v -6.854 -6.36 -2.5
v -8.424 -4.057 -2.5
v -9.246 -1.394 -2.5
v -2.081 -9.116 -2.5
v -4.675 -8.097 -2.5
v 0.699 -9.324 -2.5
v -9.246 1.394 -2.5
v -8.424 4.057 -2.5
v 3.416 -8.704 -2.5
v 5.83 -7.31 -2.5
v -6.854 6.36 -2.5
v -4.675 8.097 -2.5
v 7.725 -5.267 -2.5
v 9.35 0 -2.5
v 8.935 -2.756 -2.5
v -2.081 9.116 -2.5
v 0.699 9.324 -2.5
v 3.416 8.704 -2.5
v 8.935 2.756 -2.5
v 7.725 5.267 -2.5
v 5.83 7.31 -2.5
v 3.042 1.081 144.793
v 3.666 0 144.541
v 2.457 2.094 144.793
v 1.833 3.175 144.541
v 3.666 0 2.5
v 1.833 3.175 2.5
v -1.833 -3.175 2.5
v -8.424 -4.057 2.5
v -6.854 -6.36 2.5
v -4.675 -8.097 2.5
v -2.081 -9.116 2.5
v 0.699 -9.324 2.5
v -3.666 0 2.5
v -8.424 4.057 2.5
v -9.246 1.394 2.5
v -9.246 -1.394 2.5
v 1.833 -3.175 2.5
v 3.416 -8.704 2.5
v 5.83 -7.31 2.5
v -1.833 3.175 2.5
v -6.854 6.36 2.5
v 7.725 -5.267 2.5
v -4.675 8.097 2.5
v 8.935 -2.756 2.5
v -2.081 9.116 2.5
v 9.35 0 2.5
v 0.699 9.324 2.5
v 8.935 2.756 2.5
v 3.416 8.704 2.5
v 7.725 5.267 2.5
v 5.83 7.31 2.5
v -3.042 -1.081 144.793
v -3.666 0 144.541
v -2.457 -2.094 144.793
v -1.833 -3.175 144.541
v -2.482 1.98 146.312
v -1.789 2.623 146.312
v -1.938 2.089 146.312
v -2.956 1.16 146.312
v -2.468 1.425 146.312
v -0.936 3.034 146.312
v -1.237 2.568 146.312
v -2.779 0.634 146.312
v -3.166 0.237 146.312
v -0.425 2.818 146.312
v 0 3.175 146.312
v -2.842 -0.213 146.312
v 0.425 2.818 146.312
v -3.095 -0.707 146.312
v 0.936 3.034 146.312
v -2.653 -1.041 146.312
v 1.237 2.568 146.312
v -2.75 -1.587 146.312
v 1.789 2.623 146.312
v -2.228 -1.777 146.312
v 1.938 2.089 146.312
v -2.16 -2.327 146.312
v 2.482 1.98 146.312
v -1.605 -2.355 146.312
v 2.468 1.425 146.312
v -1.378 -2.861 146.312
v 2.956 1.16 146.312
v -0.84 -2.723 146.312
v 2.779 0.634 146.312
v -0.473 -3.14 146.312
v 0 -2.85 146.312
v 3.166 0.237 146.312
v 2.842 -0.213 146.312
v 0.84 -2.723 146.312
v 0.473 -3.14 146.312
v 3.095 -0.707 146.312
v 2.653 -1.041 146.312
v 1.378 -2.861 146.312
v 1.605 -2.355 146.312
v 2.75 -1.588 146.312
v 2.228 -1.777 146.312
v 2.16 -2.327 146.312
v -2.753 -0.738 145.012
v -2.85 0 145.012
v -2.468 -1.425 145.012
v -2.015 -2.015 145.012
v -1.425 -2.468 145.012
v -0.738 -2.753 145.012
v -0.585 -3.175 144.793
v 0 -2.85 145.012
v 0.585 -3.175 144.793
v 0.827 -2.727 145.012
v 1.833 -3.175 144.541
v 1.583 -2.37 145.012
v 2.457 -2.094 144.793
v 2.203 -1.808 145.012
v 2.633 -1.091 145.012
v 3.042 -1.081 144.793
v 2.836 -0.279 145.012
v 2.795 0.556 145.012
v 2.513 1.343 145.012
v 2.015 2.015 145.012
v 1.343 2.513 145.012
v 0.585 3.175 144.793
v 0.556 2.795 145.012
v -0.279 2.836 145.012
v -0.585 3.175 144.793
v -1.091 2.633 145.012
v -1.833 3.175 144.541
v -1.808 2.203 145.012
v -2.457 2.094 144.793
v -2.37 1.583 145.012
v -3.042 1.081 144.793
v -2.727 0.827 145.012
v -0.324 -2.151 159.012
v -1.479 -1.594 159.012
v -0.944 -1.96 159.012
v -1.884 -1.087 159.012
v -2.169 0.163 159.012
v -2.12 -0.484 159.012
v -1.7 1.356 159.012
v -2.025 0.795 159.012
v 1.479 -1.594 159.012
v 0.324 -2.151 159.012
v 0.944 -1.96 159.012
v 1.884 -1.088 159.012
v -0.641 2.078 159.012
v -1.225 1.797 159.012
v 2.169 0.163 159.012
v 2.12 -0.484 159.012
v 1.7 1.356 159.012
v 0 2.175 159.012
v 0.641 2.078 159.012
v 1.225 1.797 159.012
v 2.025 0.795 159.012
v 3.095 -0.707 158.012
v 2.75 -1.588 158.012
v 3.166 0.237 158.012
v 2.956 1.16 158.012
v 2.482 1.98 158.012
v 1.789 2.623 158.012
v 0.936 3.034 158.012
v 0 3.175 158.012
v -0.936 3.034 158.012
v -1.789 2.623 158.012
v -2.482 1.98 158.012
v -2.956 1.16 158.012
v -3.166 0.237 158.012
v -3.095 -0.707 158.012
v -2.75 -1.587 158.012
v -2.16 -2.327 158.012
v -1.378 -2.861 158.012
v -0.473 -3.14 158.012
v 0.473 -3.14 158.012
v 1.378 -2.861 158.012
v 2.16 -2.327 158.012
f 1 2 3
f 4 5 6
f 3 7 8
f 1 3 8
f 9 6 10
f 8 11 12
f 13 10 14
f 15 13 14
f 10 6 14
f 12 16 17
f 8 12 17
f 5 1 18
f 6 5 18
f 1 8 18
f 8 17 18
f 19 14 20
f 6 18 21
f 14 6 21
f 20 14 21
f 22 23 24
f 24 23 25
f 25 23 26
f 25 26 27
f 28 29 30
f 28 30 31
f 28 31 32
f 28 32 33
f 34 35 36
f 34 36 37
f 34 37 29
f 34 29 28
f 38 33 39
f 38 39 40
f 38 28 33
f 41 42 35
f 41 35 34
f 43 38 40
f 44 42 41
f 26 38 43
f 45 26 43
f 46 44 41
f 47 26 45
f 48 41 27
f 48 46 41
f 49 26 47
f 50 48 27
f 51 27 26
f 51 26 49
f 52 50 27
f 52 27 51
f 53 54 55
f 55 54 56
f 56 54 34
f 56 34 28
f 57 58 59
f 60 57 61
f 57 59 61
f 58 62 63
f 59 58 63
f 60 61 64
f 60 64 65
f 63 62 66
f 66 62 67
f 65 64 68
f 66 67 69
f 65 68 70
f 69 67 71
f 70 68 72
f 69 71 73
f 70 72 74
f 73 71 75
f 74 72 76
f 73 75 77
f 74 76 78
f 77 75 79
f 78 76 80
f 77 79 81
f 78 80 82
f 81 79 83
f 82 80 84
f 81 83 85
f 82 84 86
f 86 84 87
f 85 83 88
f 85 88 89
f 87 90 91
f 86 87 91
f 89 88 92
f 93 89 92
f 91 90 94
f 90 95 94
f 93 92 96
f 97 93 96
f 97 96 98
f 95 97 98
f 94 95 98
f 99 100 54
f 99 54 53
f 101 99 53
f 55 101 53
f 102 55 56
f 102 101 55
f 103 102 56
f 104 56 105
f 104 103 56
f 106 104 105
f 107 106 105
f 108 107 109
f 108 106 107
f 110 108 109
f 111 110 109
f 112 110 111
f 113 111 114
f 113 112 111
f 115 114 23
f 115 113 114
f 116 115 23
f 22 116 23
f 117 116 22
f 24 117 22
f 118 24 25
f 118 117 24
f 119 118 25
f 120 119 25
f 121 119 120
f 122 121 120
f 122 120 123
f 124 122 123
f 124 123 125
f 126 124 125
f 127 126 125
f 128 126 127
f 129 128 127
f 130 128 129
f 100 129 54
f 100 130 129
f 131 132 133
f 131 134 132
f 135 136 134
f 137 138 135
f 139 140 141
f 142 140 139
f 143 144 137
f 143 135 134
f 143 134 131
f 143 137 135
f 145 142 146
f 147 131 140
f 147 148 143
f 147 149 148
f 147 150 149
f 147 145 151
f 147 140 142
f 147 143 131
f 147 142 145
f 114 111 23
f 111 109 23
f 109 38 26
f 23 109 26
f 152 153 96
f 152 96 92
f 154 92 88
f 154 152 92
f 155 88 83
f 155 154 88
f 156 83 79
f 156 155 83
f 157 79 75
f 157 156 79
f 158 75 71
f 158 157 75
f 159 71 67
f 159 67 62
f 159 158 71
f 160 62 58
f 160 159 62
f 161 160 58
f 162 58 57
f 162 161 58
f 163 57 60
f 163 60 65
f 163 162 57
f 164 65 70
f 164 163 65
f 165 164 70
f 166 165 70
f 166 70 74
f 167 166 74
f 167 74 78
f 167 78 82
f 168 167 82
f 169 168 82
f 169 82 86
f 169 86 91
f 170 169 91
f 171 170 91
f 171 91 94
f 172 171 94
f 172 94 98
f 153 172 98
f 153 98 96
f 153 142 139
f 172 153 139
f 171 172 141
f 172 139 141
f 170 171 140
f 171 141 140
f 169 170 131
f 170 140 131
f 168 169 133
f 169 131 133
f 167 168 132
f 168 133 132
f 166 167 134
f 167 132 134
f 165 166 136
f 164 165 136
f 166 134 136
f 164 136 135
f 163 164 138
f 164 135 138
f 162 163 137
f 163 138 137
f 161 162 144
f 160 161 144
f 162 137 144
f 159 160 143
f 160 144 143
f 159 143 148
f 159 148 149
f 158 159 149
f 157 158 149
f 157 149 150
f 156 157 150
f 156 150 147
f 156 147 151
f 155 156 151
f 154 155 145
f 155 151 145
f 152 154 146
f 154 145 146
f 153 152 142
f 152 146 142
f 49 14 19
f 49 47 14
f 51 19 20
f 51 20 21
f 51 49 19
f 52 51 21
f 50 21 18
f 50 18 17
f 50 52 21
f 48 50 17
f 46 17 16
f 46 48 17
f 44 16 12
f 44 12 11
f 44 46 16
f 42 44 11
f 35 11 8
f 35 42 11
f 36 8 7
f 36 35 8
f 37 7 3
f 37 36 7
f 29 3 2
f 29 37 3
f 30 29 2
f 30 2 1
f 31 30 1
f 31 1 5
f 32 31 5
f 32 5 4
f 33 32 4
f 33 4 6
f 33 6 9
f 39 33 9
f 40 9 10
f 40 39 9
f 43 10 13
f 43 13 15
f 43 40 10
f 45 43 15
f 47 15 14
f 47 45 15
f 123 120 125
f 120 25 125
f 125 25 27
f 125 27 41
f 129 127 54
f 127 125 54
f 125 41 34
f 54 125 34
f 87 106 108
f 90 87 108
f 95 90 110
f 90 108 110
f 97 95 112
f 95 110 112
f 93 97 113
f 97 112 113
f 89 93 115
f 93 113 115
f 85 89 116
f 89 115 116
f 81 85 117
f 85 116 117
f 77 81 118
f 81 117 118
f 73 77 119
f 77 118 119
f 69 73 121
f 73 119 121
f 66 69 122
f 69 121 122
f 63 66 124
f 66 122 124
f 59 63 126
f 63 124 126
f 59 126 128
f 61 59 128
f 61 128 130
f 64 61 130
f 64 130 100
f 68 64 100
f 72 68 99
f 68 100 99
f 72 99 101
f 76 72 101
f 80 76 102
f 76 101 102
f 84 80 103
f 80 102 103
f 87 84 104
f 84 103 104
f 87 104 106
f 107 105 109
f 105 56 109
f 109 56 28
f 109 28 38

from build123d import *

# Parameters (mm, degrees)
SKETCH1_R          = 9.35
PISTON_DEPTH       = 2.5
ROD_DEPTH          = 159.0119
SKETCH4_R          = 9.35
SKETCH4_R_2        = 3.175
THREAD_DEPTH       = 14
CHAMFER1_SIZE      = 1
SKETCH5_W          = 1.3
SKETCH5_H          = 2.54
CUT_REVOLVE1_ANGLE = 180


with BuildPart() as part:
    # Sketch1 → Piston (new, symmetric)
    with BuildSketch(Plane.XY):
        Circle(SKETCH1_R)
    extrude(amount=PISTON_DEPTH, both=True)

    # Sketch2 → Rod (add)
    with BuildSketch(Plane.XY):
        Polygon((3.666174209, 0), (1.833087105, 3.175), (-1.833087105, 3.175), (-3.666174209, 0), (-1.833087105, -3.175), (1.833087105, -3.175), align=None)
    extrude(amount=ROD_DEPTH)

    # Sketch4 → Thread (cut)
    with BuildSketch(Plane.XY.offset(159.0119)):
        Circle(SKETCH4_R)
        with Locations(Location((0, 0, 0), (0, 0, 330))):
            Circle(SKETCH4_R_2, mode=Mode.SUBTRACT)
    extrude(amount=-THREAD_DEPTH, mode=Mode.SUBTRACT)

    # Chamfer1
    chamfer1_edges = [part.edges().sort_by_distance(p)[0] for p in [
        (-2.749630657, 1.5875, 159.0119),
    ]]
    chamfer(chamfer1_edges, length=CHAMFER1_SIZE)

    # Sketch5 → Cut-Revolve1 (revolve, cut)
    with BuildSketch(Plane(origin=(0, 0, 0), x_dir=(0, 0, -1), z_dir=(1, 0, 0))):
        with Locations((-145.6619, 4.12)):
            Rectangle(SKETCH5_W, SKETCH5_H)
        with Locations((-145.6619, -4.12)):
            Rectangle(SKETCH5_W, SKETCH5_H)
    revolve(axis=Axis((0, 0, 47.288533753), (0, 0, 1)), revolution_arc=CUT_REVOLVE1_ANGLE, mode=Mode.SUBTRACT)

    # Sketch6 → Cut-Revolve2 (revolve, cut)
    with BuildSketch(Plane(origin=(0, 0, 0), x_dir=(0, 0, -1), z_dir=(1, 0, 0)), mode=Mode.PRIVATE) as cut_revolve2_sk:
        Polygon((-145.0119, 2.85), (-145.0119, 7.746831352), (-142.184713101, 7.746831352), align=None)
    revolve(cut_revolve2_sk.sketch.rotate(Axis((0, 0, 96.043182271), (0, 0, 1)), 90), axis=Axis((0, 0, 96.043182271), (0, 0, 1)), mode=Mode.SUBTRACT)


solid = part.part
